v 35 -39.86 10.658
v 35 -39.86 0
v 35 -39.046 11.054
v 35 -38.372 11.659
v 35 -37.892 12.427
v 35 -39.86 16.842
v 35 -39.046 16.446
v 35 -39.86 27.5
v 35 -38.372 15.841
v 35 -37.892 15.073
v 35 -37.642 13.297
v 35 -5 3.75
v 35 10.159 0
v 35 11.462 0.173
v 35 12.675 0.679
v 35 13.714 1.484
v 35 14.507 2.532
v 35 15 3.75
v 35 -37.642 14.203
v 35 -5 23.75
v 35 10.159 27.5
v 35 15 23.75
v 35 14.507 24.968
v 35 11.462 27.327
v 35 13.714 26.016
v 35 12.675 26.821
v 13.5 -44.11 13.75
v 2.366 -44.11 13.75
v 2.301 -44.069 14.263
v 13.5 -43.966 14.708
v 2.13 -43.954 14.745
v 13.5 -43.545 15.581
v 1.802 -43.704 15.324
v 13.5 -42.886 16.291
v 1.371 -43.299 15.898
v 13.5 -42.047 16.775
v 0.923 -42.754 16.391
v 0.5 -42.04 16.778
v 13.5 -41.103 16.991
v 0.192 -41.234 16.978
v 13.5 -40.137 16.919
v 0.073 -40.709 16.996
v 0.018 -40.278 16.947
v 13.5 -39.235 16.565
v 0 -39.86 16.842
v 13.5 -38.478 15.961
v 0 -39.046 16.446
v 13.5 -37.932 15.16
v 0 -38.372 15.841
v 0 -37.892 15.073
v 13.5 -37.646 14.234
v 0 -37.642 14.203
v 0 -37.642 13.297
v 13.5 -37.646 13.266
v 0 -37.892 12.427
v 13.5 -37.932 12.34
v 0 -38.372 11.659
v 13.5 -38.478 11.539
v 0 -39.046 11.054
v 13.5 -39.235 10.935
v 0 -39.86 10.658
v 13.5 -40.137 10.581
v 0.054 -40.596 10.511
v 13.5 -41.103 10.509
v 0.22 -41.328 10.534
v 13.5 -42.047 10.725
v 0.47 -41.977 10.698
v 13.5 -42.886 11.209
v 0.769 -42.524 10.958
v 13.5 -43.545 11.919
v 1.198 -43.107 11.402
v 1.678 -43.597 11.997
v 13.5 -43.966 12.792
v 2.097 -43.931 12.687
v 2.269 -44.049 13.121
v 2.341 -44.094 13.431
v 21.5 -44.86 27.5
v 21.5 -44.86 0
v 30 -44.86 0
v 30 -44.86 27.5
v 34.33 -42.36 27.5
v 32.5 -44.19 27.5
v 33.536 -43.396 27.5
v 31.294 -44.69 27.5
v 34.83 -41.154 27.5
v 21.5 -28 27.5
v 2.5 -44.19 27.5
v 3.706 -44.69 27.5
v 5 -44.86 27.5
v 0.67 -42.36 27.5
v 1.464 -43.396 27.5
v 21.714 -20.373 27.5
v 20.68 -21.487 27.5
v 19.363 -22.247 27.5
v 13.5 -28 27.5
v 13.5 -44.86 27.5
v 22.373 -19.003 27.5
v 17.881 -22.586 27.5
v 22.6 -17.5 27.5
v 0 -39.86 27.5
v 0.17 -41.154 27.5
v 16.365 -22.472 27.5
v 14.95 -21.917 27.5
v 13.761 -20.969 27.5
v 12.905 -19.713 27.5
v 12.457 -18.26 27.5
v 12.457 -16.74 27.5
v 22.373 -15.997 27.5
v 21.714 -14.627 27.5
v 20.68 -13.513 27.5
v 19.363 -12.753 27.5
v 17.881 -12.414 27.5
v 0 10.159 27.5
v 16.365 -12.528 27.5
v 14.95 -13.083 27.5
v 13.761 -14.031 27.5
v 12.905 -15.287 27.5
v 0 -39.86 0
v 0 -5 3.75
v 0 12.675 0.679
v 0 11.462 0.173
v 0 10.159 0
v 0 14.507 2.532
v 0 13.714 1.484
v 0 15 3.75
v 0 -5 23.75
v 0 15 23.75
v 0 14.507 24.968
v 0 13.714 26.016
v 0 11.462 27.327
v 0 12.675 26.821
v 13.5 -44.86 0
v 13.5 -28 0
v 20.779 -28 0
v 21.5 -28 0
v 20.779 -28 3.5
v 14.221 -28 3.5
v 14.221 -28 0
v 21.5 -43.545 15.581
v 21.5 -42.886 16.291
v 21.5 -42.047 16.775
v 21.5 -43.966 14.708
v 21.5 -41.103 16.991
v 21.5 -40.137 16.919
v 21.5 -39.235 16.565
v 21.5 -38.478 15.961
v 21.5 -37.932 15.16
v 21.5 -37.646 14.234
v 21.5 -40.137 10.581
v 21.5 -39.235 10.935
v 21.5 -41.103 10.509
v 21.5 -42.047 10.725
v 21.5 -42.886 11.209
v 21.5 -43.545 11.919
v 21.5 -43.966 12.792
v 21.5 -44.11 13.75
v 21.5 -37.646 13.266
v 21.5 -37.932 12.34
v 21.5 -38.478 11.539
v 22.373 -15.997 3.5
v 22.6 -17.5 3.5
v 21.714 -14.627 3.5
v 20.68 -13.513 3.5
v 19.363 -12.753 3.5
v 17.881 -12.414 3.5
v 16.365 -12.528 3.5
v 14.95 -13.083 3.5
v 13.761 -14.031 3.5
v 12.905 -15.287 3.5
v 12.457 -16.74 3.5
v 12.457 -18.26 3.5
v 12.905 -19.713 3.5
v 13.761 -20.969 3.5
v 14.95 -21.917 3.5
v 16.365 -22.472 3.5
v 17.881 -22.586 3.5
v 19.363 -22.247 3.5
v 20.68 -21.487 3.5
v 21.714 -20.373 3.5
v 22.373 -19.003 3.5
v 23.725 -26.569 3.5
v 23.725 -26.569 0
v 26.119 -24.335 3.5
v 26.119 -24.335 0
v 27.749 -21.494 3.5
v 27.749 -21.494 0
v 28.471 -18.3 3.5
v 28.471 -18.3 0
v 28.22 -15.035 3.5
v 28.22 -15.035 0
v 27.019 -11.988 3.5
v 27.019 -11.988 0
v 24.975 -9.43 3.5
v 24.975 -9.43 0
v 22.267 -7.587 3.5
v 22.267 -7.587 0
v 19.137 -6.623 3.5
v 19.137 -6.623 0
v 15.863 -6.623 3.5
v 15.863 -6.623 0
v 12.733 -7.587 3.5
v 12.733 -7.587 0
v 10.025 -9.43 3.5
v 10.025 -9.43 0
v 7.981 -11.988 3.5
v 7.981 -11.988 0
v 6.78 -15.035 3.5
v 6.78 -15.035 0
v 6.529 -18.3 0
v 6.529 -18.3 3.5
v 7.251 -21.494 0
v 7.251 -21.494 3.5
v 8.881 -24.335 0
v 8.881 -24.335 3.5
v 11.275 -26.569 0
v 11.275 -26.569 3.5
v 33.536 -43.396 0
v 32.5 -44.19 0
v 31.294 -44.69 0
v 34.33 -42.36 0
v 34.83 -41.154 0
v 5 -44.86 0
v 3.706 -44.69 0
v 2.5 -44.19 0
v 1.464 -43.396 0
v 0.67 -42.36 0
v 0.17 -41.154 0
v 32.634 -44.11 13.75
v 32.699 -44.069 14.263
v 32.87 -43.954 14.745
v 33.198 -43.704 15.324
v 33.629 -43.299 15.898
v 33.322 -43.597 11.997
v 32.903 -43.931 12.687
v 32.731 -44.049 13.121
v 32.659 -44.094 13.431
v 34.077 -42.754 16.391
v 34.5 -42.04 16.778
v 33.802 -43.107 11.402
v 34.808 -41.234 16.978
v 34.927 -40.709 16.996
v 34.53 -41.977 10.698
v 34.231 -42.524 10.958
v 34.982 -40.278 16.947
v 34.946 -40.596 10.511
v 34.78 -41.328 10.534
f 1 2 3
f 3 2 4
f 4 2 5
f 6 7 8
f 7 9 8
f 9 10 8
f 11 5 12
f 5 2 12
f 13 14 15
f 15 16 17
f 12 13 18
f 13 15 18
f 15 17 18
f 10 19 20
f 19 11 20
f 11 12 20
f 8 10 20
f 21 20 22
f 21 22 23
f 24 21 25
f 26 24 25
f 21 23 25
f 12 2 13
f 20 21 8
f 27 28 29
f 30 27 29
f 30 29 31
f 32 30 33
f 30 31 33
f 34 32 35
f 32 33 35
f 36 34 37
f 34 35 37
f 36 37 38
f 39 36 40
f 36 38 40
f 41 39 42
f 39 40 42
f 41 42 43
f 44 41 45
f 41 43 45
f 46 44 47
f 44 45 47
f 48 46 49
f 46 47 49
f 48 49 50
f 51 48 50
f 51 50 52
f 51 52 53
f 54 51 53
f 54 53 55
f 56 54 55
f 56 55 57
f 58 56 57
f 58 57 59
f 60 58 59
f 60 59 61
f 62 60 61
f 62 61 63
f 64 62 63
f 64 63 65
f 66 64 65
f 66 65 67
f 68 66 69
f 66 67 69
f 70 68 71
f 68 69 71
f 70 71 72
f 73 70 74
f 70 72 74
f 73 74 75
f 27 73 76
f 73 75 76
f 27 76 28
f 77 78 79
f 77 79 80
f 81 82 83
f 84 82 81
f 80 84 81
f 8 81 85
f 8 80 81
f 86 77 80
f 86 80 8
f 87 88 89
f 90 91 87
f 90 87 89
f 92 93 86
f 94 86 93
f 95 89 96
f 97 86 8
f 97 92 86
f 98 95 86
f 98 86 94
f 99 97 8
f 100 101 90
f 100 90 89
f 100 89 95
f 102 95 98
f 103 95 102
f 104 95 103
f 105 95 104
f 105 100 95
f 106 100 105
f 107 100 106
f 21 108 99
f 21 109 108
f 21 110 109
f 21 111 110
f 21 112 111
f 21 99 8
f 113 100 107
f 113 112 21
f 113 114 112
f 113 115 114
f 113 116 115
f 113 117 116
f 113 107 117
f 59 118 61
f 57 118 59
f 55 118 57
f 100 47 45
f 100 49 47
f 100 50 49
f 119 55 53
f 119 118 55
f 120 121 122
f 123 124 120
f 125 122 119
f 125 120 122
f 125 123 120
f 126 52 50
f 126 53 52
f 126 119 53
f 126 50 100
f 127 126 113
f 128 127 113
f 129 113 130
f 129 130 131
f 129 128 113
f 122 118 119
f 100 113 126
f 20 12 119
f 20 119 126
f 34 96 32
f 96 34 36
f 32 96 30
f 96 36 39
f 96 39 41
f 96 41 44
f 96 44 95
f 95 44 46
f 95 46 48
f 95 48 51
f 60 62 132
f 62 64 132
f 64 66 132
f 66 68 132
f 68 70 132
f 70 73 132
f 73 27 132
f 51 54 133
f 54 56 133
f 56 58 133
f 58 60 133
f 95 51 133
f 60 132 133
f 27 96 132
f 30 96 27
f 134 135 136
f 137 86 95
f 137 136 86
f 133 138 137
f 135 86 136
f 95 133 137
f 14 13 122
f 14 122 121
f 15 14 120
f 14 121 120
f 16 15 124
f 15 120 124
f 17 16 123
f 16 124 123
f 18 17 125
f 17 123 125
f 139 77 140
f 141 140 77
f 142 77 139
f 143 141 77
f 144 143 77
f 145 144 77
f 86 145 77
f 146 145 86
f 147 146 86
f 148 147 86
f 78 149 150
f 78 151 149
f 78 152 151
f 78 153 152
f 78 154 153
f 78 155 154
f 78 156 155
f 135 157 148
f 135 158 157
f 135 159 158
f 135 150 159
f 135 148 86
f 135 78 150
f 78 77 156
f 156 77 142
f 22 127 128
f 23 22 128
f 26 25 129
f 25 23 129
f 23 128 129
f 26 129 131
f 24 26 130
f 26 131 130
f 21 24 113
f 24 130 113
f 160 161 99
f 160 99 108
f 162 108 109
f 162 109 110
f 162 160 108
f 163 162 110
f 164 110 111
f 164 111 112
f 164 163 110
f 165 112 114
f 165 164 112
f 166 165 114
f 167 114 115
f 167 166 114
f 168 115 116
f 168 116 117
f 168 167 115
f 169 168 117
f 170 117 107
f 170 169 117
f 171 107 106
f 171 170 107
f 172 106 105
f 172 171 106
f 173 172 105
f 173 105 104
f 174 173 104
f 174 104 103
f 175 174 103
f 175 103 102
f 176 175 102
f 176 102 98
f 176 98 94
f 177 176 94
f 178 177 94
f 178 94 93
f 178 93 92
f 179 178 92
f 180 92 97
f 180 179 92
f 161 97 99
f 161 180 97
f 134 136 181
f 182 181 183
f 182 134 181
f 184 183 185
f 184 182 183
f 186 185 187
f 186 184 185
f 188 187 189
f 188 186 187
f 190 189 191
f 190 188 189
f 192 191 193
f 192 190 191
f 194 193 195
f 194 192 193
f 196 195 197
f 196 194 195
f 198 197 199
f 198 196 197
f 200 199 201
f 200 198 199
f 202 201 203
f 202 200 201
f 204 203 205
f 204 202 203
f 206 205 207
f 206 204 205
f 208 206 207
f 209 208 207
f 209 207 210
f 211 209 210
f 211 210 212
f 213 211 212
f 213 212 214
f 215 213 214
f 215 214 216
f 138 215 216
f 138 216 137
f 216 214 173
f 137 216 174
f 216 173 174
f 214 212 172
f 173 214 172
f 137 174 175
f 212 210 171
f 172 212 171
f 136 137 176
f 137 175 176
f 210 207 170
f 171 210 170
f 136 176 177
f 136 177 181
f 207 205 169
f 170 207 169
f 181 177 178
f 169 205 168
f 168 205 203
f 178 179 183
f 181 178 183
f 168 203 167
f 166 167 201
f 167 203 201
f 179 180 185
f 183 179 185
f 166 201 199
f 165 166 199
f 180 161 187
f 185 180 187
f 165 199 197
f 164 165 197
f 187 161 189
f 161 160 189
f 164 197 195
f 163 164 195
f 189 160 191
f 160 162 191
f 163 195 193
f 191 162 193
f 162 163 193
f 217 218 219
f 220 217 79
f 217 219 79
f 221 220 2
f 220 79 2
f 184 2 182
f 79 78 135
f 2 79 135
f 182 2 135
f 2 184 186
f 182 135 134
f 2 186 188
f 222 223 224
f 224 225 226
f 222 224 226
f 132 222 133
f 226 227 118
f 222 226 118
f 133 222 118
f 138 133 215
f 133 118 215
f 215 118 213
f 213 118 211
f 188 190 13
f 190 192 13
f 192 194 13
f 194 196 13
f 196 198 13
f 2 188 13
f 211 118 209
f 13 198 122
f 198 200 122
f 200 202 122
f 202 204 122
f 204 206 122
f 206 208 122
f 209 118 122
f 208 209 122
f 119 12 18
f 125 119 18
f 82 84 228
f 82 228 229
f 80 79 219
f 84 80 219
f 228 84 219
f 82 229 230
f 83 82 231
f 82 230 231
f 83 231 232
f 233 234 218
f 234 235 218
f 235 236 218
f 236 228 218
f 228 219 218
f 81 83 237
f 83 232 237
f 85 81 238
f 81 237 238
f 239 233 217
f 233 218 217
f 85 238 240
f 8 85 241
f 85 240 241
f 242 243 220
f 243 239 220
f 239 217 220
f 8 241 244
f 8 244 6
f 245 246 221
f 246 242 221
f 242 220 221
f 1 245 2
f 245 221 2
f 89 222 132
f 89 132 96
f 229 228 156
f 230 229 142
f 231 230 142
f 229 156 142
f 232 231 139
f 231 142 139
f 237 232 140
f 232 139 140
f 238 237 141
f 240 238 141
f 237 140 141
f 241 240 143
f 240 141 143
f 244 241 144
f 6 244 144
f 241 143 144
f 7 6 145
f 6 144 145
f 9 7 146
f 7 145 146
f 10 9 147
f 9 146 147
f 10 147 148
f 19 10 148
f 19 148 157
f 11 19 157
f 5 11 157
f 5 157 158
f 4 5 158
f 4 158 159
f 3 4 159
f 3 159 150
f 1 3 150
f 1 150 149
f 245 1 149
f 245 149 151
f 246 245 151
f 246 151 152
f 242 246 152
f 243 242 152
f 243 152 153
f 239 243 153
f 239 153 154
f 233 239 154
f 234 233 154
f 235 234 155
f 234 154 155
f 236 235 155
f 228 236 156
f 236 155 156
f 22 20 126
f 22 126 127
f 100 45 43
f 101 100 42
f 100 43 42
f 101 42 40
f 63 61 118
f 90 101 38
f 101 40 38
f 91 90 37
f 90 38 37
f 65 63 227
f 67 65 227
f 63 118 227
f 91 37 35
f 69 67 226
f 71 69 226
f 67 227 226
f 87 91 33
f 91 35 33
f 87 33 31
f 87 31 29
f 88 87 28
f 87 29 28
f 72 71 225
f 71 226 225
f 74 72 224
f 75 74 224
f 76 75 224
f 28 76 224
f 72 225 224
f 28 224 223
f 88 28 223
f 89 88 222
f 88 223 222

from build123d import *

# Parameters (mm, degrees)
CROQUIS1_W              = 35
CROQUIS1_H              = 35
CROQUIS1_R              = 11
ENTRADABASE_DEPTH       = 3.5
CROQUIS2_W              = 35
CROQUIS2_H              = 35
CROQUIS2_R              = 5.1
ENTRADACAVIDAD_DEPTH    = 24
REDONDEO1_R             = 5
CROQUIS4_W              = 27.5
CROQUIS4_H              = 14.86
CROQUIS4_R              = 3.25
BARRENORODAMIENTO_DEPTH = 35
CROQUIS5_W              = 8
CROQUIS5_H              = 16.86
ENTRADARODAMIENTO_DEPTH = 64.195487181
DETALLE2_R              = 5
CROQUIS10_W             = 3.75
CROQUIS10_H             = 15
SALIENTE_EXTRUIR4_DEPTH = 35
REDONDEO5_R             = 5
CROQUIS11_W             = 20
CROQUIS11_H             = 20
CORTAR_EXTRUIR5_DEPTH   = 64.195487351


with BuildPart() as part:
    # Croquis1 → EntradaBase (new body)
    with BuildSketch(Plane.XY):
        with Locations((17.5, -17.5)):
            Rectangle(CROQUIS1_W, CROQUIS1_H)
        with Locations((17.5, -17.5)):
            Circle(CROQUIS1_R, mode=Mode.SUBTRACT)
    extrude(amount=ENTRADABASE_DEPTH)

    # Croquis2 → EntradaCavidad (add)
    with BuildSketch(Plane.XY.offset(3.5)):
        with Locations((17.5, -17.5)):
            Rectangle(CROQUIS2_W, CROQUIS2_H)
        with Locations((17.5, -17.5)):
            Circle(CROQUIS2_R, mode=Mode.SUBTRACT)
    extrude(amount=ENTRADACAVIDAD_DEPTH)

    # Redondeo1
    redondeo1_edges = [part.edges().sort_by_distance(p)[0] for p in [
        (35, -35, 13.75),
        (0, -35, 13.75),
    ]]
    fillet(redondeo1_edges, radius=REDONDEO1_R)

    # Croquis4 → BarrenoRodamiento (add, through all)
    with BuildSketch(Plane.ZY):
        with Locations((13.75, -37.43)):
            Rectangle(CROQUIS4_W, CROQUIS4_H)
        with Locations(Location((13.75, -40.86, 0), (0, 0, 270))):
            Circle(CROQUIS4_R, mode=Mode.SUBTRACT)
    extrude(amount=-BARRENORODAMIENTO_DEPTH)

    # Croquis5 → EntradaRodamiento (cut, through all)
    with BuildSketch(Plane(origin=(0, 0, 0), x_dir=(-1, 0, 0), z_dir=(0, 0, -1))):
        with Locations((-17.5, -36.43)):
            Rectangle(CROQUIS5_W, CROQUIS5_H)
    extrude(amount=-ENTRADARODAMIENTO_DEPTH, mode=Mode.SUBTRACT)

    # Detalle2
    # the kernel refuses this fillet: 5 mm, written as the material it takes off along each edge
    with BuildSketch(Plane(origin=(35, -44.86, -12.5), x_dir=(-1, 0, 0), z_dir=(0, 0, 1))) as detalle2_piece_1:
        with BuildLine():
            CenterArc((DETALLE2_R, -DETALLE2_R), DETALLE2_R, 90, 90)
            Line((0, -DETALLE2_R), (0, 0))
            Line((0, 0), (DETALLE2_R, 0))
        make_face()
    extrude(amount=52.5, mode=Mode.SUBTRACT)
    with BuildSketch(Plane(origin=(0, -44.86, -12.5), x_dir=(1, 0, 0), z_dir=(0, 0, 1))) as detalle2_piece_2:
        with BuildLine():
            CenterArc((DETALLE2_R, DETALLE2_R), DETALLE2_R, 180, 90)
            Line((0, DETALLE2_R), (0, 0))
            Line((0, 0), (DETALLE2_R, 0))
        make_face()
    extrude(amount=52.5, mode=Mode.SUBTRACT)

    # Croquis10 → Saliente-Extruir4 (add, through all)
    with BuildSketch(Plane.ZY):
        with Locations((1.875, 7.5)):
            Rectangle(CROQUIS10_W, CROQUIS10_H)
        with Locations((25.625, 7.5)):
            Rectangle(CROQUIS10_W, CROQUIS10_H)
    extrude(amount=-SALIENTE_EXTRUIR4_DEPTH)

    # Redondeo5
    # the kernel refuses this fillet: 5 mm, written as the material it takes off along each edge
    with BuildSketch(Plane(origin=(-12.103072957, 15, 0), x_dir=(0, -1, 0), z_dir=(1, 0, 0))) as redondeo5_piece_1:
        with BuildLine():
            CenterArc((4.841229183, -5), REDONDEO5_R, 90, 75.522487814)
            Line((0, -3.75), (-0.096824584, -3.725))
            ThreePointArc((-0.096824584, -3.725), (-0.1, -1.875), (-0.1, 0))
            Line((-0.1, 0), (0, 0.1))
            Line((0, 0.1), (4.841229183, 0.1))
            Line((4.841229183, 0.1), (4.841229183, 0))
        make_face()
    extrude(amount=59.206145914, mode=Mode.SUBTRACT)
    with BuildSketch(Plane(origin=(-12.103072957, 15, 27.5), x_dir=(0, -1, 0), z_dir=(1, 0, 0))) as redondeo5_piece_2:
        with BuildLine():
            CenterArc((4.841229183, 5), REDONDEO5_R, 194.477512186, 75.522487814)
            Line((0, 3.75), (-0.096824584, 3.725))
            ThreePointArc((-0.096824584, 3.725), (-0.1, 1.875), (-0.1, 0))
            Line((-0.1, 0), (0, -0.1))
            Line((0, -0.1), (4.841229183, -0.1))
            Line((4.841229183, -0.1), (4.841229183, 0))
        make_face()
    extrude(amount=59.206145914, mode=Mode.SUBTRACT)

    # Croquis11 → Cortar-Extruir5 (cut, through all)
    with BuildSketch(Plane.ZY):
        with Locations((13.75, 5)):
            Rectangle(CROQUIS11_W, CROQUIS11_H)
    extrude(amount=-CORTAR_EXTRUIR5_DEPTH, mode=Mode.SUBTRACT)


solid = part.part
